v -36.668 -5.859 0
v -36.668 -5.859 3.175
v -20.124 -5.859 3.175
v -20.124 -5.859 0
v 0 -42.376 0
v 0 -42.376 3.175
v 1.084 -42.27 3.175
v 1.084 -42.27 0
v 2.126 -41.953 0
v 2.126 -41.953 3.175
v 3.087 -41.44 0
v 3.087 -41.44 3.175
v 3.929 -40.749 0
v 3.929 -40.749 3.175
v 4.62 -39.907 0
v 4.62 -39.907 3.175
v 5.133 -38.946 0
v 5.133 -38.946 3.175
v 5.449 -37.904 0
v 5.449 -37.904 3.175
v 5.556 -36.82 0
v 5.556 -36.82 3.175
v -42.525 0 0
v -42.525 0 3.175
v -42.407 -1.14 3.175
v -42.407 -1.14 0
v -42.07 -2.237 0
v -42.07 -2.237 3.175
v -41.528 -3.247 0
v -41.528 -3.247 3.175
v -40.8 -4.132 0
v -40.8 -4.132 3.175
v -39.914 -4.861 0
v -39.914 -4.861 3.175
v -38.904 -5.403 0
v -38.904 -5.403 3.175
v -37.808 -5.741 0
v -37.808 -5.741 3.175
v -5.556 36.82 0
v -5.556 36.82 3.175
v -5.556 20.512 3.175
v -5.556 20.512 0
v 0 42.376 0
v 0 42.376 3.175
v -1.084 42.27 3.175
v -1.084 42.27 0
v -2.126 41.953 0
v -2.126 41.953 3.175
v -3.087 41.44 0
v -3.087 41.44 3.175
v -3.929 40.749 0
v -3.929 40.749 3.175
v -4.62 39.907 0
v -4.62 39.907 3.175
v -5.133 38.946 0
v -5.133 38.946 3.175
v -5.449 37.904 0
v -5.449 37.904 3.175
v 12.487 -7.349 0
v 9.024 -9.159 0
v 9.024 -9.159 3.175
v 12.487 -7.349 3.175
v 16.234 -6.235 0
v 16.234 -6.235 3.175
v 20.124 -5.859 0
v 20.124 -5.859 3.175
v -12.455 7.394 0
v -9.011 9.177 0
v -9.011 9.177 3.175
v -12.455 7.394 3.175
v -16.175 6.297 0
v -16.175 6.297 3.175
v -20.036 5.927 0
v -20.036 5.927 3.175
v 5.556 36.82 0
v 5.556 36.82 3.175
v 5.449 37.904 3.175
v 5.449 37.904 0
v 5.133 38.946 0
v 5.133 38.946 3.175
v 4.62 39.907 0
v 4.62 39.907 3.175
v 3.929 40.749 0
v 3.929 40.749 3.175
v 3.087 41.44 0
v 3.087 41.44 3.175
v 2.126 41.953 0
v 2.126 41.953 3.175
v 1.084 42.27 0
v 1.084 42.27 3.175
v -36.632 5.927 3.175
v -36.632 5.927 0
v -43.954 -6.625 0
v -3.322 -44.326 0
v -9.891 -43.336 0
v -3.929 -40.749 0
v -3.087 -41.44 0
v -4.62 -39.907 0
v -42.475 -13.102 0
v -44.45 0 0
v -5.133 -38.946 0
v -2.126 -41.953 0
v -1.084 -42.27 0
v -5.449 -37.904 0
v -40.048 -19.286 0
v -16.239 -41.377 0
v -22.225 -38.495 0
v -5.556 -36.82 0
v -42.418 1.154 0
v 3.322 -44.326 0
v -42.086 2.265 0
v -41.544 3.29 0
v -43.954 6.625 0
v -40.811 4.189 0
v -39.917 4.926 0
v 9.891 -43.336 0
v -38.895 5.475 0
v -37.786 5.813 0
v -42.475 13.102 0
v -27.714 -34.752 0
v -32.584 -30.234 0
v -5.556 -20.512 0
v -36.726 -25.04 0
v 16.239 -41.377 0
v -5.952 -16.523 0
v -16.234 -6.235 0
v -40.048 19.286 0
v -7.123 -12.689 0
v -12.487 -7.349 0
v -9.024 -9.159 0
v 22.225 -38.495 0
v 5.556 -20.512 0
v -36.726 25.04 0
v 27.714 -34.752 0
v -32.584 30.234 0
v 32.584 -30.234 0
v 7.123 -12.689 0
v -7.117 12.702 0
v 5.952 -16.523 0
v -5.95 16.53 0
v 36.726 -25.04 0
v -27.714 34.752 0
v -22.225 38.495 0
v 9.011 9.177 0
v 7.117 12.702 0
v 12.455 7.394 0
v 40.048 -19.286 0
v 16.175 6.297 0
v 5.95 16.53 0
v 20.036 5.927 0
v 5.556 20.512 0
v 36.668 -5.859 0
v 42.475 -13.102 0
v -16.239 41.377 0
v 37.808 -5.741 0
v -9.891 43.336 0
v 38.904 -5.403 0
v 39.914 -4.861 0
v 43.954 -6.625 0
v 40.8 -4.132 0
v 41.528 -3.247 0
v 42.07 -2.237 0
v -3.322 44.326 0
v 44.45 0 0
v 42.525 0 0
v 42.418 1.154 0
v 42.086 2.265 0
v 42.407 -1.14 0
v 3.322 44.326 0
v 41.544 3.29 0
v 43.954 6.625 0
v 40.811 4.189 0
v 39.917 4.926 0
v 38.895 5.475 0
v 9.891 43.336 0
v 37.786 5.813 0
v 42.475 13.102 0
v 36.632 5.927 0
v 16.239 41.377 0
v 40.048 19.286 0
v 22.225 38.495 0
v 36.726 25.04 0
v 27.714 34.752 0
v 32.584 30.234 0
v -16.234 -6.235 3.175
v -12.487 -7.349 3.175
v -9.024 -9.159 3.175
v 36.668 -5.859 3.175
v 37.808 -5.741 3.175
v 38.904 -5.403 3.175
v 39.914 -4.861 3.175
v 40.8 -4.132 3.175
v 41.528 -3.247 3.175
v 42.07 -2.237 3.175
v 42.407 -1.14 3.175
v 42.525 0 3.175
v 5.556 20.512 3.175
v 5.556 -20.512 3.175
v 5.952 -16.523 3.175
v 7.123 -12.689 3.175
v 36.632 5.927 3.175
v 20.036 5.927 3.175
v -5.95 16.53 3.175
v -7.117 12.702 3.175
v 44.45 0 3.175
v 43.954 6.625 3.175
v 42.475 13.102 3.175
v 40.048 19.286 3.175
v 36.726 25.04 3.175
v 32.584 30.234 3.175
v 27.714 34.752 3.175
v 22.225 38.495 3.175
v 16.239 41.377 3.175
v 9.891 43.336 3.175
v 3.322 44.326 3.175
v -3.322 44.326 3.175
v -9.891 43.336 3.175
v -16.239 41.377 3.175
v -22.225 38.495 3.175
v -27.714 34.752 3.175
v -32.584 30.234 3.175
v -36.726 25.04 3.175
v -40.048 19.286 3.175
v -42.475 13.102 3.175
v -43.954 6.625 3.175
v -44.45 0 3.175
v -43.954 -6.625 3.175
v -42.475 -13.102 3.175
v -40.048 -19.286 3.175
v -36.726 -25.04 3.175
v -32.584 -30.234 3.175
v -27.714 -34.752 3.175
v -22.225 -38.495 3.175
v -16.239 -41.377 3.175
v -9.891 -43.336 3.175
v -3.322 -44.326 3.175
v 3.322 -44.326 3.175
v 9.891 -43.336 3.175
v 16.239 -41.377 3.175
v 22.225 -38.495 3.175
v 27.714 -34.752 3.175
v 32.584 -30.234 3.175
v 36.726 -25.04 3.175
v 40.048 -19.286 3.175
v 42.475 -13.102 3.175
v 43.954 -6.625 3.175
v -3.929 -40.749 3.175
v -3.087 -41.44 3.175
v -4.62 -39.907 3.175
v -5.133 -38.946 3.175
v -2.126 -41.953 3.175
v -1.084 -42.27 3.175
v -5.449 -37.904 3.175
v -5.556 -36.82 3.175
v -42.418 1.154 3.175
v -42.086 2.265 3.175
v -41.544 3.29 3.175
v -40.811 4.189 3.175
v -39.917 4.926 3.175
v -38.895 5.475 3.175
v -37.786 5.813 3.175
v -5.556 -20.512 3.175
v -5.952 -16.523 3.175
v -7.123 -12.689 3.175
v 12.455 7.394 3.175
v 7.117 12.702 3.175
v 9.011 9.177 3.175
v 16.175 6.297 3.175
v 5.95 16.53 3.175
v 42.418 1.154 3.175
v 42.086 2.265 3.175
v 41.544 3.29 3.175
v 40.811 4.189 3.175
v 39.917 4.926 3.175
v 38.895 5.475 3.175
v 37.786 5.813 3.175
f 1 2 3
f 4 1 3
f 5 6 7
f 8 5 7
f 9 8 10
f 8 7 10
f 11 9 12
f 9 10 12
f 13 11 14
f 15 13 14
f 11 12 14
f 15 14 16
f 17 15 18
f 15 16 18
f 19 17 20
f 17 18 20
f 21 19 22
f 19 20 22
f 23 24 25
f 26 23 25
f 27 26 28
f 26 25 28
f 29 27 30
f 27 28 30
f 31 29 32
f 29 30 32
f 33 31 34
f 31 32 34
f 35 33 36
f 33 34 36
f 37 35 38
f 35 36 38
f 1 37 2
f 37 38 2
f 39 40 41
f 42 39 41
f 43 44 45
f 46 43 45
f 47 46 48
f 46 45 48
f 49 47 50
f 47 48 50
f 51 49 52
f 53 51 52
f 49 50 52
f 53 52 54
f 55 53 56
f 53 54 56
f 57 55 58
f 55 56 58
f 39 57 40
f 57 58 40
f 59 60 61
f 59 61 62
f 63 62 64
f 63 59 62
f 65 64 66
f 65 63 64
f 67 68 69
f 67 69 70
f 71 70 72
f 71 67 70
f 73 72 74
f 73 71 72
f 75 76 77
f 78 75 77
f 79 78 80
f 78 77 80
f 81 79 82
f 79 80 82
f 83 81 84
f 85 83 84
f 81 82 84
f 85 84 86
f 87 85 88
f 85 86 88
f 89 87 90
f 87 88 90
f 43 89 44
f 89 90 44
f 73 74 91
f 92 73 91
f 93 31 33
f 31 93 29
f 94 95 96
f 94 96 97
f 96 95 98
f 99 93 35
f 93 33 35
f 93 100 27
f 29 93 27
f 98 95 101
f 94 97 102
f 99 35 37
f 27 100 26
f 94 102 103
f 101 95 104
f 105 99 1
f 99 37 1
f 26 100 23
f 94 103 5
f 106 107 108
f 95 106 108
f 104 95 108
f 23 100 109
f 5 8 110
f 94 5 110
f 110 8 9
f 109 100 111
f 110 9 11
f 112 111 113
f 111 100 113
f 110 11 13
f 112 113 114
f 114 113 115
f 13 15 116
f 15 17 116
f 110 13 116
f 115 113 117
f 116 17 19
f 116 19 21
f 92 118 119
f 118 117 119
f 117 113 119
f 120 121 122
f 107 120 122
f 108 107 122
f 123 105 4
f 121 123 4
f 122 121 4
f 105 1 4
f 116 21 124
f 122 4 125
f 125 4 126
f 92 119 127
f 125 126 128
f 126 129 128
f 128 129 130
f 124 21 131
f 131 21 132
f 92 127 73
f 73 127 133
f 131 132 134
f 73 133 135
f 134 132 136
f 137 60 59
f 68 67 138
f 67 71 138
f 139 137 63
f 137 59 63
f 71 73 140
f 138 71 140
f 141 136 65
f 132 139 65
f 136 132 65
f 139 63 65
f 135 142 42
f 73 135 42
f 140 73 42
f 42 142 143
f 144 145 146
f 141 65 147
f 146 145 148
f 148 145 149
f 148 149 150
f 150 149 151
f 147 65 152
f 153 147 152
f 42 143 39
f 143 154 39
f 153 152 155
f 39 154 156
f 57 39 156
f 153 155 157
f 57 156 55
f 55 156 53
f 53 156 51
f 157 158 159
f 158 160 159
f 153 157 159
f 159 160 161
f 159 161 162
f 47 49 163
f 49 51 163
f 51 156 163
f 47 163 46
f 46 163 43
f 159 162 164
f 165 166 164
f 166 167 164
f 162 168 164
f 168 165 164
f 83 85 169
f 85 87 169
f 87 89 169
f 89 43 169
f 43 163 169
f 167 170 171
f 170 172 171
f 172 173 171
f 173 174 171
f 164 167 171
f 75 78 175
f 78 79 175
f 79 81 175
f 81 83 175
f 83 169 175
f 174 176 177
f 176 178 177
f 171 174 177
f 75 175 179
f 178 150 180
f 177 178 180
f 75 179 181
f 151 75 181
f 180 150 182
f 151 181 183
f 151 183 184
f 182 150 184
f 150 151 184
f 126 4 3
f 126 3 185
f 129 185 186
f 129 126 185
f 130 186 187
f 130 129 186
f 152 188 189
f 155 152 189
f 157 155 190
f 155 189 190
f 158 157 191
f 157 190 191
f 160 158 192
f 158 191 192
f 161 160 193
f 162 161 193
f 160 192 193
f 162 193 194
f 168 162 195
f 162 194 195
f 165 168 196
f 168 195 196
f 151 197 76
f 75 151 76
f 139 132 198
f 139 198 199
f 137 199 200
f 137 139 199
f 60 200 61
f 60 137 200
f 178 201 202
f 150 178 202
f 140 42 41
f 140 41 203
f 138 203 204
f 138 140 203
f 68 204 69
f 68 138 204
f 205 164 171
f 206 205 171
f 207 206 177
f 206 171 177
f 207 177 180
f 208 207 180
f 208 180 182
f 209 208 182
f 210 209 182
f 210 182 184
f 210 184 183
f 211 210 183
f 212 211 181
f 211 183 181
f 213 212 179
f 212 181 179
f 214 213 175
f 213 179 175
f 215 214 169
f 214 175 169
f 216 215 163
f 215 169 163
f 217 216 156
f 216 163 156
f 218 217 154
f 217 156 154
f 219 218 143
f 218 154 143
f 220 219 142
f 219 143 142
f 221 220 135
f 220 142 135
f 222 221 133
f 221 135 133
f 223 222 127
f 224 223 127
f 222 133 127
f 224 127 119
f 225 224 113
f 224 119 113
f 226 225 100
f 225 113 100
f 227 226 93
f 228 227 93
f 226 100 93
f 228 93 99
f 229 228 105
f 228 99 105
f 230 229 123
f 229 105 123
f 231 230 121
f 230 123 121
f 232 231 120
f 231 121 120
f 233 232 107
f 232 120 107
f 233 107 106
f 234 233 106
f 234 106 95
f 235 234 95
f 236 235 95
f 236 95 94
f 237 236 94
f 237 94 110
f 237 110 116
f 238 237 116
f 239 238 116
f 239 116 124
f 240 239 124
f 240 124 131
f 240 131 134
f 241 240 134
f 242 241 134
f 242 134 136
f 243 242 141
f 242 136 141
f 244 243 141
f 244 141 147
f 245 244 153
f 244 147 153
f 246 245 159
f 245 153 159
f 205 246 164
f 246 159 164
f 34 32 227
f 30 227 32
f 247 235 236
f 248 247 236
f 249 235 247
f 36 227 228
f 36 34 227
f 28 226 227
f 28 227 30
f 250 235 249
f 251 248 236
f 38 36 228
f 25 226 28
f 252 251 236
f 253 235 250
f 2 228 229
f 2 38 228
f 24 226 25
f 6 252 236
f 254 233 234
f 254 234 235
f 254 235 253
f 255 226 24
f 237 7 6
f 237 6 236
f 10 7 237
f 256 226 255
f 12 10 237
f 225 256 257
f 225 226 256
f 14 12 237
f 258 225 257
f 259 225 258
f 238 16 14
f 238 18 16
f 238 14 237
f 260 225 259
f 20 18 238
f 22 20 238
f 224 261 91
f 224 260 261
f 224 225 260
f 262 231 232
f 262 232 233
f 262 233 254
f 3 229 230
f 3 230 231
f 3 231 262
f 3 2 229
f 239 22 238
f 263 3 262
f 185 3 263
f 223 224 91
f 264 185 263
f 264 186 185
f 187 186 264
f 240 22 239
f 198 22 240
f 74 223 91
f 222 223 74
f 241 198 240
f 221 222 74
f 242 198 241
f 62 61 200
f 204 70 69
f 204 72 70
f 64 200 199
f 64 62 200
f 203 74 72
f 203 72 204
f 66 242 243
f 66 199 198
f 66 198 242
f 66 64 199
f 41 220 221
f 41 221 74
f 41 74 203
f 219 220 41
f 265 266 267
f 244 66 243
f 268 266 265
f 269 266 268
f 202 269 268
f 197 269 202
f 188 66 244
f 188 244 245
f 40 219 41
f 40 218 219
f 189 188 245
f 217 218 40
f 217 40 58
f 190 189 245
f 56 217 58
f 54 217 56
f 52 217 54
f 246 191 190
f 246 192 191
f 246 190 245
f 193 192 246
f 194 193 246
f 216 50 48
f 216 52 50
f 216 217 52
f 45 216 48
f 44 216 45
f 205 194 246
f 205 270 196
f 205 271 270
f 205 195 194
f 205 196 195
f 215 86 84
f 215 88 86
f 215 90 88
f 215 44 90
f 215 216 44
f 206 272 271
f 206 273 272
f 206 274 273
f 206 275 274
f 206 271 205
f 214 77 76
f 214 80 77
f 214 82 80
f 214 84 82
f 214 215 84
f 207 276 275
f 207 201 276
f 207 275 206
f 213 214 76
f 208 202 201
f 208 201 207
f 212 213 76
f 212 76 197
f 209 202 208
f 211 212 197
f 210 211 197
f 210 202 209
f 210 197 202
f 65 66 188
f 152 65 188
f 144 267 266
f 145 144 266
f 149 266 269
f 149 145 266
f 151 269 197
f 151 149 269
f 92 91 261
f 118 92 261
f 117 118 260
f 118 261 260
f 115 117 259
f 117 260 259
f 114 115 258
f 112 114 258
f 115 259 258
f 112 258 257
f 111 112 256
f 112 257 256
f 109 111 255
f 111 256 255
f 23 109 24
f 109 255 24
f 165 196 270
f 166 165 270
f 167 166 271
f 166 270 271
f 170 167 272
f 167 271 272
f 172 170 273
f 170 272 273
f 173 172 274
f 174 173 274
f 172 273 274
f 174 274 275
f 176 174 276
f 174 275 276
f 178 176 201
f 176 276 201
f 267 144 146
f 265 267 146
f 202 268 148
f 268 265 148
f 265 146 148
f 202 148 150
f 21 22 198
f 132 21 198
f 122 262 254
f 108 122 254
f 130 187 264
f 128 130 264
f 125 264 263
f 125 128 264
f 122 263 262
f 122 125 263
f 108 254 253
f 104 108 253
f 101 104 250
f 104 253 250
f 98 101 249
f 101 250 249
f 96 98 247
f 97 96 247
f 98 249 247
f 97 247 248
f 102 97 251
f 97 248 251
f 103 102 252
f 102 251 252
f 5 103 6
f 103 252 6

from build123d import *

# Parameters (mm, degrees)
F0_R        = 44.45
F0_R_2      = 12.7
F1_DEPTH    = 3.175
F3_DEPTH    = 25.4
F4_T1_DEPTH = 48.6343800889
F4_T3_DEPTH = 47.4571451006
F4_T5_DEPTH = 47.1924378771


# Not quite as in the source:
# - a fillet or chamfer that OpenCascade refuses, or shapes differently, is made with other operations: its cross-section is extruded or revolved along the edge and cut away or added


with BuildPart() as f1:
    # F0 (on Top) → F1 (new body)
    with BuildSketch(Plane.XY):
        Circle(F0_R)
        Circle(F0_R_2, mode=Mode.SUBTRACT)
    extrude(amount=F1_DEPTH)

    # F2 (on face) → F3 (cut)
    with BuildSketch(Plane.XY.offset(3.175)):
        with BuildLine():
            Line((-42.5250590142, 0), (-12.7, 0))
            ThreePointArc((-12.7, 0), (-12.3276162196, 3.0528475792), (-11.2323026233, 5.9266666667))
            Line((-11.2323026233, 5.9266666667), (-36.6323026233, 5.9266666667))
            ThreePointArc((-36.6323026233, 5.9266666667), (-40.8111169187, 4.1887178728), (-42.5250590142, 0))
        make_face()
        with BuildLine():
            ThreePointArc((-11.2677815117, -5.8589333333), (-12.3367504878, -3.0157233628), (-12.7, 0))
            Line((-12.7, 0), (-42.5250590142, 0))
            ThreePointArc((-42.5250590142, 0), (-40.79976808, -4.1324743979), (-36.6677815117, -5.8589333333))
            Line((-36.6677815117, -5.8589333333), (-11.2677815117, -5.8589333333))
        make_face()
        with BuildLine():
            Line((0, 12.7), (0, 42.3763238149))
            ThreePointArc((0, 42.3763238149), (-3.928862053, 40.7489358679), (-5.55625, 36.8200738149))
            Line((-5.55625, 36.8200738149), (-5.55625, 11.4200738149))
            ThreePointArc((-5.55625, 11.4200738149), (-2.8508825433, 12.3758825433), (0, 12.7))
        make_face()
        with BuildLine():
            ThreePointArc((5.55625, 36.8200738149), (3.928862053, 40.7489358679), (0, 42.3763238149))
            Line((0, 42.3763238149), (0, 12.7))
            ThreePointArc((0, 12.7), (2.8508825433, 12.3758825433), (5.55625, 11.4200738149))
            Line((5.55625, 11.4200738149), (5.55625, 36.8200738149))
        make_face()
        with BuildLine():
            ThreePointArc((5.55625, -11.4200738149), (2.8508825433, -12.3758825433), (0, -12.7))
            Line((0, -12.7), (0, -42.3763238149))
            ThreePointArc((0, -42.3763238149), (3.928862053, -40.7489358679), (5.55625, -36.8200738149))
            Line((5.55625, -36.8200738149), (5.55625, -11.4200738149))
        make_face()
        with BuildLine():
            Line((0, -42.3763238149), (0, -12.7))
            ThreePointArc((0, -12.7), (-2.8508825433, -12.3758825433), (-5.55625, -11.4200738149))
            Line((-5.55625, -11.4200738149), (-5.55625, -36.8200738149))
            ThreePointArc((-5.55625, -36.8200738149), (-3.928862053, -40.7489358679), (0, -42.3763238149))
        make_face()
        with BuildLine():
            ThreePointArc((11.2323026233, 5.9266666667), (12.3276162196, 3.0528475792), (12.7, 0))
            Line((12.7, 0), (42.5250590142, 0))
            ThreePointArc((42.5250590142, 0), (40.8111169187, 4.1887178728), (36.6323026233, 5.9266666667))
            Line((36.6323026233, 5.9266666667), (11.2323026233, 5.9266666667))
        make_face()
        with BuildLine():
            Line((42.5250590142, 0), (12.7, 0))
            ThreePointArc((12.7, 0), (12.3367504878, -3.0157233628), (11.2677815117, -5.8589333333))
            Line((11.2677815117, -5.8589333333), (36.6677815117, -5.8589333333))
            ThreePointArc((36.6677815117, -5.8589333333), (40.79976808, -4.1324743979), (42.5250590142, 0))
        make_face()
    extrude(amount=-F3_DEPTH, mode=Mode.SUBTRACT)

    # F4: fillet of radius 20.32 on 8 edges, made by hand

    # F4_s2 → F4_t1 (cut)
    with BuildSketch(Plane.XY.offset(-22.7296900444)):
        with BuildLine():
            ThreePointArc((-9.9524038462, -7.8892114741), (-6.6867352348, -13.8287677255), (-5.55625, -20.5119498327))
            Line((-5.55625, -20.5119498327), (-5.55625, -11.4200738149))
            ThreePointArc((-5.55625, -11.4200738149), (-7.9527563302, -9.901700195), (-9.9524038462, -7.8892114741))
        make_face()
        with BuildLine():
            ThreePointArc((9.9524038462, 7.8892114741), (6.6867352348, 13.8287677255), (5.55625, 20.5119498327))
            Line((5.55625, 20.5119498327), (5.55625, 11.4200738149))
            ThreePointArc((5.55625, 11.4200738149), (7.9527563302, 9.901700195), (9.9524038462, 7.8892114741))
        make_face()
        with BuildLine():
            ThreePointArc((-5.55625, 20.5119498327), (-6.6867352348, 13.8287677255), (-9.9524038462, 7.8892114741))
            ThreePointArc((-9.9524038462, 7.8892114741), (-7.9527563302, 9.901700195), (-5.55625, 11.4200738149))
            Line((-5.55625, 11.4200738149), (-5.55625, 20.5119498327))
        make_face()
        with BuildLine():
            ThreePointArc((5.55625, -20.5119498327), (6.6867352348, -13.8287677255), (9.9524038462, -7.8892114741))
            ThreePointArc((9.9524038462, -7.8892114741), (7.9527563302, -9.901700195), (5.55625, -11.4200738149))
            Line((5.55625, -11.4200738149), (5.55625, -20.5119498327))
        make_face()
    extrude(amount=F4_T1_DEPTH, mode=Mode.SUBTRACT)

    # F4_s4 → F4_t3 (cut)
    with BuildSketch(Plane.XY.offset(-22.1410725503)):
        with BuildLine():
            ThreePointArc((-20.1242105318, -5.8589333333), (-13.5841452612, -6.9401717761), (-7.7400809738, -10.0688205128))
            ThreePointArc((-7.7400809738, -10.0688205128), (-9.7342435034, -8.1568684811), (-11.2677815117, -5.8589333333))
            Line((-11.2677815117, -5.8589333333), (-20.1242105318, -5.8589333333))
        make_face()
        with BuildLine():
            ThreePointArc((7.7400809738, -10.0688205128), (13.5841452612, -6.9401717761), (20.1242105318, -5.8589333333))
            Line((20.1242105318, -5.8589333333), (11.2677815117, -5.8589333333))
            ThreePointArc((11.2677815117, -5.8589333333), (9.7342435034, -8.1568684811), (7.7400809738, -10.0688205128))
        make_face()
    extrude(amount=F4_T3_DEPTH, mode=Mode.SUBTRACT)

    # F4_s6 → F4_t5 (cut)
    with BuildSketch(Plane.XY.offset(-22.0087189386)):
        with BuildLine():
            ThreePointArc((7.7060731534, 10.0948717949), (13.5281820281, 6.9969020993), (20.0357901988, 5.9266666667))
            Line((20.0357901988, 5.9266666667), (11.2323026233, 5.9266666667))
            ThreePointArc((11.2323026233, 5.9266666667), (9.6958239858, 8.2024994506), (7.7060731534, 10.0948717949))
        make_face()
        with BuildLine():
            ThreePointArc((-7.7060731534, 10.0948717949), (-13.5281820281, 6.9969020993), (-20.0357901988, 5.9266666667))
            Line((-20.0357901988, 5.9266666667), (-11.2323026233, 5.9266666667))
            ThreePointArc((-11.2323026233, 5.9266666667), (-9.6958239858, 8.2024994506), (-7.7060731534, 10.0948717949))
        make_face()
    extrude(amount=F4_T5_DEPTH, mode=Mode.SUBTRACT)


solid = f1.part
